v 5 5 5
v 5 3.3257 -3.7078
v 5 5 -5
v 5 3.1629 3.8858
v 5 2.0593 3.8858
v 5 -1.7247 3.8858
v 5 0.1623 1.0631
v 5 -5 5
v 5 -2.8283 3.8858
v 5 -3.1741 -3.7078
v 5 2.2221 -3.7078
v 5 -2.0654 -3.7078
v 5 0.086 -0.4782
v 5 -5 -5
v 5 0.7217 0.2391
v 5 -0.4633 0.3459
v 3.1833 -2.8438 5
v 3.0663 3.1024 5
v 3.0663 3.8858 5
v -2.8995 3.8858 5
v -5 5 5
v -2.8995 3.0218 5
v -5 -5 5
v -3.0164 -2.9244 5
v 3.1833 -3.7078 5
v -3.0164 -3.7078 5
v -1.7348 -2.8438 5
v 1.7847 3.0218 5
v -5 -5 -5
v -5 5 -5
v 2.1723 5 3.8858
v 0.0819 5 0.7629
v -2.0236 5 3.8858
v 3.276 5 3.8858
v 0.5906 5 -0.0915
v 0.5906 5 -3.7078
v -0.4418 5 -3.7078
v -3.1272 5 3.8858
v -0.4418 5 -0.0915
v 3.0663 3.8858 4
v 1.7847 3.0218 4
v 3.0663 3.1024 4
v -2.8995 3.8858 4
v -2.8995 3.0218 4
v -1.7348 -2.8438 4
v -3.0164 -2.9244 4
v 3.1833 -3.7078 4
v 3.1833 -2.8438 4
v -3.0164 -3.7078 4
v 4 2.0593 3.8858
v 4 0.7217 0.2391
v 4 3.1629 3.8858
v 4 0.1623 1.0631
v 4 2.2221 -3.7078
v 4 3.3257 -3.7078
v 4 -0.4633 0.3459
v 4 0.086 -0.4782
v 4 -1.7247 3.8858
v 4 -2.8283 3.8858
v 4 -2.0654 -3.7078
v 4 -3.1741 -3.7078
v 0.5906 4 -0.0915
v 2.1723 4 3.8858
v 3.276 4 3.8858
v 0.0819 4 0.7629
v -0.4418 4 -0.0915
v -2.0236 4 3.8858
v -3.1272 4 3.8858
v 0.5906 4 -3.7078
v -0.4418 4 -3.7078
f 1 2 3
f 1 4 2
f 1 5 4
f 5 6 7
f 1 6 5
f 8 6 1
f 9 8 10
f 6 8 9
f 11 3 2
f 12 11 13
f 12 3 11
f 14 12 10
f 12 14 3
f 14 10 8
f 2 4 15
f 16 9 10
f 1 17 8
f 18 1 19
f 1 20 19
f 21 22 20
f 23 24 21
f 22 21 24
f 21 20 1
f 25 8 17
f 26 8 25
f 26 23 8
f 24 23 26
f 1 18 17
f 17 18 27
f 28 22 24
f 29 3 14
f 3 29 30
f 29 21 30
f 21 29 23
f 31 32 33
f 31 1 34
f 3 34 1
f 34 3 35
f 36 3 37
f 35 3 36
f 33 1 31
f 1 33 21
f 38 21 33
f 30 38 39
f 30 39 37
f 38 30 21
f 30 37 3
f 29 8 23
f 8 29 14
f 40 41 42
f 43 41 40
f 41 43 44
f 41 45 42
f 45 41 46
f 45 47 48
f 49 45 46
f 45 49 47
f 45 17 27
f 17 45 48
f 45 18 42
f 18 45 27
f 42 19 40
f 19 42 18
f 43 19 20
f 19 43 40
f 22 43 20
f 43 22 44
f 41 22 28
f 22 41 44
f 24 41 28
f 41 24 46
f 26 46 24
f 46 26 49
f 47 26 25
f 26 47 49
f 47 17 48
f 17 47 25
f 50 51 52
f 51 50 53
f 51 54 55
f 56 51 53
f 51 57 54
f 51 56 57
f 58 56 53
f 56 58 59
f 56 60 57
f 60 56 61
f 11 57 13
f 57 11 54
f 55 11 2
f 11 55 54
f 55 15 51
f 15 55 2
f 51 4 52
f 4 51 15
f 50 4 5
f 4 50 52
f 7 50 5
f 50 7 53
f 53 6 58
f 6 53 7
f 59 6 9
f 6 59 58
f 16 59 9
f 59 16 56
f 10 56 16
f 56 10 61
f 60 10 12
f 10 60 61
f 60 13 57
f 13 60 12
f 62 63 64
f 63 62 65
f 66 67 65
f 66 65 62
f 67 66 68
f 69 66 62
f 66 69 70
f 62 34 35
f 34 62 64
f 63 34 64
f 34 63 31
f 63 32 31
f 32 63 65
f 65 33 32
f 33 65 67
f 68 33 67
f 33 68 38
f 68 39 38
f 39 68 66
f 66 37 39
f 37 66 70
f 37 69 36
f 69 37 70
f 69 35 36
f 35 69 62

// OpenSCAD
//!OpenSCAD

Font_thickness = 1;
Font_size = 10;
edge_length = 10;
difference() {
  cube([edge_length, edge_length, edge_length], center=true);

  translate([0, 0, (edge_length / 2 - 1)]){
    // size is multiplied by 0.75 because openScad font sizes are in points, not pixels
    linear_extrude( height=Font_thickness, twist=0, center=false){
      text("Z", font = "Roboto", size = Font_size*0.75, halign="center", valign="center");
    }

  }
  translate([(edge_length / 2 - 1), 0, 0]){
    rotate([90, 0, 90]){
      // size is multiplied by 0.75 because openScad font sizes are in points, not pixels
      linear_extrude( height=Font_thickness, twist=0, center=false){
        text("X", font = "Roboto", size = Font_size*0.75, halign="center", valign="center");
      }

    }
  }
  translate([0, (edge_length / 2), 0]){
    rotate([90, 0, 0]){
      // size is multiplied by 0.75 because openScad font sizes are in points, not pixels
      linear_extrude( height=Font_thickness, twist=0, center=false){
        text("Y", font = "Roboto", size = Font_size*0.75, halign="center", valign="center");
      }

    }
  }
}
